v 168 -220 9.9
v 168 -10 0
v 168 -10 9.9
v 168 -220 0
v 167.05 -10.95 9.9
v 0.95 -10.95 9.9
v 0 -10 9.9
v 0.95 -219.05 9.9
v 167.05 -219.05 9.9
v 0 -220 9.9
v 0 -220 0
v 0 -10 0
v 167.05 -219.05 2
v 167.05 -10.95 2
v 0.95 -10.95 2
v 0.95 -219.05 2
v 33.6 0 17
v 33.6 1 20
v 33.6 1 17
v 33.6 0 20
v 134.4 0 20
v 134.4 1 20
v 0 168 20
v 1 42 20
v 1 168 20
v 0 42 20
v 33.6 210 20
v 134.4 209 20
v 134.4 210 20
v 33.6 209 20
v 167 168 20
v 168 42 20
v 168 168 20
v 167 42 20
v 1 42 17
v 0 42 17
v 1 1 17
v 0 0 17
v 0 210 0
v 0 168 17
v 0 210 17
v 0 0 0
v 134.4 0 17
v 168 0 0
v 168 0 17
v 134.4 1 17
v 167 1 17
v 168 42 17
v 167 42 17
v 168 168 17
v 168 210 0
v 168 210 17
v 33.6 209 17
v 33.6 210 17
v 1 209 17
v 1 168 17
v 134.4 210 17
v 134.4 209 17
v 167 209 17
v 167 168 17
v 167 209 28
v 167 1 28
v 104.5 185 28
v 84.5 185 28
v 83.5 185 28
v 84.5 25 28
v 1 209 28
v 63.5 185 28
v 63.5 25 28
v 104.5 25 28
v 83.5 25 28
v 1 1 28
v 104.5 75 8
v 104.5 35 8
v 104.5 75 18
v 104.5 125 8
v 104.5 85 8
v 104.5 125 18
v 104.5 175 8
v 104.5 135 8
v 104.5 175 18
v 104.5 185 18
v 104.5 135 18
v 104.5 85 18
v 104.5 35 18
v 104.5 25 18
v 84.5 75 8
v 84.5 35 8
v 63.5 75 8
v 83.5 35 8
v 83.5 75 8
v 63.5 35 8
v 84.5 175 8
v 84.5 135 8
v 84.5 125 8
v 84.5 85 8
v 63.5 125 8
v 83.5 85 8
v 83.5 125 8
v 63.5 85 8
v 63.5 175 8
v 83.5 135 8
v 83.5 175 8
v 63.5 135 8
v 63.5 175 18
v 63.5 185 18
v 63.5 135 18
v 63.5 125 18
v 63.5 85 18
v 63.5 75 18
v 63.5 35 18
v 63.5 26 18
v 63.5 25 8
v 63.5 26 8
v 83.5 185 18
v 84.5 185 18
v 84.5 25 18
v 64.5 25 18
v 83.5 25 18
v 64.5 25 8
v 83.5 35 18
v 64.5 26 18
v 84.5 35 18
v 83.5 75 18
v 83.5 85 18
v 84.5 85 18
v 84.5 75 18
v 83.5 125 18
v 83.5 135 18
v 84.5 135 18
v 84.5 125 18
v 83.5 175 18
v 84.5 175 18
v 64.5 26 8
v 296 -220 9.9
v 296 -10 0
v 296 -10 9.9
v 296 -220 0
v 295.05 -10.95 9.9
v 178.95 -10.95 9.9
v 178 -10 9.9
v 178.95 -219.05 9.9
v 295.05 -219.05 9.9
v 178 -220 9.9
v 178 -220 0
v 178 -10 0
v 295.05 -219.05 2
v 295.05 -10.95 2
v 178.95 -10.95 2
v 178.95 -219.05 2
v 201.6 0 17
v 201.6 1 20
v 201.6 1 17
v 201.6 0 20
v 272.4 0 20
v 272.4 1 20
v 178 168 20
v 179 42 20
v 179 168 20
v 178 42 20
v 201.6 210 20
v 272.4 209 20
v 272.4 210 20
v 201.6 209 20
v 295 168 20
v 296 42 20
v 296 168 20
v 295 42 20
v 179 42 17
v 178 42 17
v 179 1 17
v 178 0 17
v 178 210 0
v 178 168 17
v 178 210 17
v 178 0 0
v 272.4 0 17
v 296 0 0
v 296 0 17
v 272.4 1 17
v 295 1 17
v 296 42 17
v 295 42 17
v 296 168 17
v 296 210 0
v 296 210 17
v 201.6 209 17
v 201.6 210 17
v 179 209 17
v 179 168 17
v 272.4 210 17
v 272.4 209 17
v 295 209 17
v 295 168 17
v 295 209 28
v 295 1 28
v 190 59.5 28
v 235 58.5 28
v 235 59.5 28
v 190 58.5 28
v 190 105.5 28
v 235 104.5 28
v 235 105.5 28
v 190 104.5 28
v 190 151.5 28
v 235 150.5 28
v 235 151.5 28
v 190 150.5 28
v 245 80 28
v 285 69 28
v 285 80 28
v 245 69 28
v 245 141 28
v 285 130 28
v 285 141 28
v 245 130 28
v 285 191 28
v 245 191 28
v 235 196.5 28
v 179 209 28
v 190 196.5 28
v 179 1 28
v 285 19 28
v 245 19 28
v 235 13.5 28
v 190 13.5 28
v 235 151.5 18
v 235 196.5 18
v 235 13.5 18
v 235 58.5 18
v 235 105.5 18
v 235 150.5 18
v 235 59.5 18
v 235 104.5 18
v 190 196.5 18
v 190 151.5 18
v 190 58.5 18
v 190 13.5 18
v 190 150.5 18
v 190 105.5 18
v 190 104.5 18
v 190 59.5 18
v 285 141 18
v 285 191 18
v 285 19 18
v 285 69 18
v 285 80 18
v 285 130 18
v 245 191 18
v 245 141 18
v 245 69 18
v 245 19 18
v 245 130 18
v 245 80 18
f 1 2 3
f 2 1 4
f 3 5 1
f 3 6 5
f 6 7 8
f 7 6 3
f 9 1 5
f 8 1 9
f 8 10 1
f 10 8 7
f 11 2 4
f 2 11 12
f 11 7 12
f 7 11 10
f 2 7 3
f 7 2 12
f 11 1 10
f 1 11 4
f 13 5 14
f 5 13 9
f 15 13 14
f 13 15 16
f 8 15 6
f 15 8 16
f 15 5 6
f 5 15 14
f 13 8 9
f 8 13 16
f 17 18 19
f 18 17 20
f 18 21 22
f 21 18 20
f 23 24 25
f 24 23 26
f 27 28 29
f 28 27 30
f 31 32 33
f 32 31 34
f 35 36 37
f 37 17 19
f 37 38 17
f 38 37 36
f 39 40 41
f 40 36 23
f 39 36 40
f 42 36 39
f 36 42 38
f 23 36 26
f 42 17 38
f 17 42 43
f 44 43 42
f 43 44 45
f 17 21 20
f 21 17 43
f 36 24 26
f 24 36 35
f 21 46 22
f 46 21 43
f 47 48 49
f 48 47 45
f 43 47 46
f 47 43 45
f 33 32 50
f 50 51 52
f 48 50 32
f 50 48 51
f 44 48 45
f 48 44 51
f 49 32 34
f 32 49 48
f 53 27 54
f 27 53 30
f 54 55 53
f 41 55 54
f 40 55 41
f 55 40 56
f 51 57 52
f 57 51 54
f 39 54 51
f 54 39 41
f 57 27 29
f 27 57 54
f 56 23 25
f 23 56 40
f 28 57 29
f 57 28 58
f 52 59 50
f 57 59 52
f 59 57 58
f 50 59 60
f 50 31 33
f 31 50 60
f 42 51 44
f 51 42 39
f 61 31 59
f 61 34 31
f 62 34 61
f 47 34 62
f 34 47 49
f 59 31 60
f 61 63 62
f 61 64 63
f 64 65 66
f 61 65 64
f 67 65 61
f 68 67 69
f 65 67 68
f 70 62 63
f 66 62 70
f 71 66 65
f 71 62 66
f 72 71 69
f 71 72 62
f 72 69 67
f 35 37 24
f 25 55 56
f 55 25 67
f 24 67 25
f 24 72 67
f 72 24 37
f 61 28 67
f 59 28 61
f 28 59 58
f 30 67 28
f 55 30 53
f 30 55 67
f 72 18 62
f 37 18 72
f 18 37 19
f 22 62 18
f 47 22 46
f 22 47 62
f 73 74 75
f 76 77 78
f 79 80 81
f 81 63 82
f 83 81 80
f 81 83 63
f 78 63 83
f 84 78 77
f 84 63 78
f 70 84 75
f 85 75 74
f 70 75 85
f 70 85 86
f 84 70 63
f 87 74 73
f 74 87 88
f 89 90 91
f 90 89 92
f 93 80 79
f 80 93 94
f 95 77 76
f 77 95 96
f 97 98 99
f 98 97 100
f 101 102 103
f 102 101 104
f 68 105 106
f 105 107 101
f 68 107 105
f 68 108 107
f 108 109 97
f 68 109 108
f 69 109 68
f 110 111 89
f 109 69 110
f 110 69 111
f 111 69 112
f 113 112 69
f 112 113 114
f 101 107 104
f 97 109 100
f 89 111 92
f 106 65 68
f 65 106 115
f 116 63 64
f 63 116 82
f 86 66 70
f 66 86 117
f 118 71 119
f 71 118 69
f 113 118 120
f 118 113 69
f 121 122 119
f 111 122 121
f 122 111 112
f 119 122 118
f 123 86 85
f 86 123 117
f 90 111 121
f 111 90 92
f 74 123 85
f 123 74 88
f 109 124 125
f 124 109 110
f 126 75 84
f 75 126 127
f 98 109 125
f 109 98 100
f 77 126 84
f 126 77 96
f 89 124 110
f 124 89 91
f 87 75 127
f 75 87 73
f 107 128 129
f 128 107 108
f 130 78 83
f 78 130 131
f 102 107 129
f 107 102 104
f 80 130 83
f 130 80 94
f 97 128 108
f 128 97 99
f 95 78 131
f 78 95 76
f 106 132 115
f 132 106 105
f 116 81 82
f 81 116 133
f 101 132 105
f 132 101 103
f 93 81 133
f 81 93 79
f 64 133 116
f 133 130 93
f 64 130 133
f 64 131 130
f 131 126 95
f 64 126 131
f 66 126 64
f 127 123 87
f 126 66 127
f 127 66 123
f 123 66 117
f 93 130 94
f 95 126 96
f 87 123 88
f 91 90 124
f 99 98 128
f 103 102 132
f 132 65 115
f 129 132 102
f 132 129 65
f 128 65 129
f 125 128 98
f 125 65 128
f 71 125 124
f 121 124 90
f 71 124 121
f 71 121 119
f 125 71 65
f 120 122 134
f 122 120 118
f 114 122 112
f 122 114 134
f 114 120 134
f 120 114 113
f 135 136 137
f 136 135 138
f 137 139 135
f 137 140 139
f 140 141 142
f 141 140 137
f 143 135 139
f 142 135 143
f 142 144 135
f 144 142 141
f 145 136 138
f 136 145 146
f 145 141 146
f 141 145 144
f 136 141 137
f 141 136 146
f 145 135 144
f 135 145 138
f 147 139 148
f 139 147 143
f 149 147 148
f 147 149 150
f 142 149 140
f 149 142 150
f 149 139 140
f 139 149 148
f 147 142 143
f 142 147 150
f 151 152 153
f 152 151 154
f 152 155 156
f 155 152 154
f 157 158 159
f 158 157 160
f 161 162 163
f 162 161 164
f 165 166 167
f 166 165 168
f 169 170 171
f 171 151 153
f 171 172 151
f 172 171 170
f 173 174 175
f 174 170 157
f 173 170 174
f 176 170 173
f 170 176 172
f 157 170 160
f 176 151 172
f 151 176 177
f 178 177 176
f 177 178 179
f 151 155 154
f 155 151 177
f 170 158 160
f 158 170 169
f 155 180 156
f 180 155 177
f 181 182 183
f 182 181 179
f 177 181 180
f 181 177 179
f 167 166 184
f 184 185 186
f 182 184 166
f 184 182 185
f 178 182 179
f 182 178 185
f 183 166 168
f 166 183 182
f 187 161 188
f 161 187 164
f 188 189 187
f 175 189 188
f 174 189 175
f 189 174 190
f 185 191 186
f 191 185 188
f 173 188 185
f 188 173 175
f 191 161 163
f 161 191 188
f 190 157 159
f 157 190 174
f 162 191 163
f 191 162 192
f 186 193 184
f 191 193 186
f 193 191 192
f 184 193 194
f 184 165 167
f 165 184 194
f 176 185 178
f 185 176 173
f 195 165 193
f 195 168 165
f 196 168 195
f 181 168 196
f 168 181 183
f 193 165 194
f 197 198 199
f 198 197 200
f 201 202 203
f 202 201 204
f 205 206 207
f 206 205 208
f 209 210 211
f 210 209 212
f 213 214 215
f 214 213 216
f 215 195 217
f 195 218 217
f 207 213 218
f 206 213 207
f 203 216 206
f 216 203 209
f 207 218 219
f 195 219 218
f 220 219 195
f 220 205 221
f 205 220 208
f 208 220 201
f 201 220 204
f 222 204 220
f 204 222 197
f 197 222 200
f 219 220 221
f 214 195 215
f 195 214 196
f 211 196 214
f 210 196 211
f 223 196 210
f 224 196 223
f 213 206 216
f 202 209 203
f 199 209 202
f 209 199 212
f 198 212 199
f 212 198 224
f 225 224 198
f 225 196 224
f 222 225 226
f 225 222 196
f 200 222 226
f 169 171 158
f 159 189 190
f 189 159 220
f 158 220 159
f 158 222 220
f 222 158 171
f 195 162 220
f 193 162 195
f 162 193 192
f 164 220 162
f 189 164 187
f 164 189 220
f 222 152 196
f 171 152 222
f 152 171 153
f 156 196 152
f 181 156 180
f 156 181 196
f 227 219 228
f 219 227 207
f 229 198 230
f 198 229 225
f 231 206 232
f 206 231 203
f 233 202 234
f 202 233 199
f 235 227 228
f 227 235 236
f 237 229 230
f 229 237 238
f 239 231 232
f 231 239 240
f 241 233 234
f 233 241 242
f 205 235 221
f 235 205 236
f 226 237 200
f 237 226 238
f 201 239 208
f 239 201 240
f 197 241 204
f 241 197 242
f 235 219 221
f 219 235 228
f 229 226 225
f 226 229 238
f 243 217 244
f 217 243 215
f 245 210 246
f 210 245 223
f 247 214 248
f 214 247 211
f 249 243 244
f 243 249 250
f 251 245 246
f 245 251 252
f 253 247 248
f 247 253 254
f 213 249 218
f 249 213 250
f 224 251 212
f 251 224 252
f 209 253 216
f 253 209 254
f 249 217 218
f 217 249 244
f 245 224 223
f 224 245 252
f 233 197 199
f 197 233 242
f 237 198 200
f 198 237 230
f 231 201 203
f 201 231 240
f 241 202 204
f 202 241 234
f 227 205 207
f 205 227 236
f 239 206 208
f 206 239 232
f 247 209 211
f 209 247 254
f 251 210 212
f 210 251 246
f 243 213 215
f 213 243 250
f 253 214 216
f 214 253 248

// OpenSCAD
include <../boardgame_insert_toolkit_lib.scad>;


// This is a working example of the Boardgame Insert Toolkit used to create a single large box insert
// for the Z-Man game, Pandemic. It is designed for a printer that can print 290mm x 210mm x 28mm.
// See the two box version for an example of a design for smaller printers.
// 
data =
[
    [   "card box",
        [
            [ "box_dimensions",                             [168.0, 210.0, 28.0] ],                       // float f -- default:[ 100, 100, 100]
            [ "enabled",                                    true ],

            [   "components",
                [
                    [   "cards",
                        [
                            ["type",                        "chit_stack"],              // "cards" | "chits" | "generic" -- default: "generic"
                            ["compartment_size",            [ 20.0, 40.0, 20.0] ],      // float f -- default:[ 10, 10, 10]
                            ["num_compartments",            [2, 3] ],                   // int i -- default: [1, 1]
                            ["enabled",                     true ],                     // true | false
                            ["rotation",                    0 ],                        // 0 | 1 
                      //      ["position",                    [0,0]]

                        ]
                    ],
                ]
            ]
        ]
    ],

    [   "chits box",
        [
            [ "box_dimensions",                             [118.0, 210.0, 28.0] ],                       // float f -- default:[ 100, 100, 100]
            [ "enabled",                                    true ],

            [   "components",
                [
                    [   "disease markers",
                        [
                            ["enabled",                     true ],                     // true | false
                            ["type",                        "chits"],
                            ["compartment_size",            [ 45.0, 45.0, 10.0] ],
                            ["num_compartments",            [1, 4] ],
                            ["position",                    [10, "center"] ],
                        ]
                    ],

                    [   "other bits",
                        [
                            ["enabled",                     true ],                     // true | false
                            ["type",                        "chits"],
                            ["compartment_size",            [ 40.0, 50.0, 10.0] ],
                            ["num_compartments",            [1, 3] ],
                            ["position",                    [65, "center"] ],
                            ["extra_spacing",               [0, 10] ]
                        ]
                    ]
                ]
            ]
        ]
    ]
];


// for printing control.
b_print_lid = true;
b_print_box = true;

b_print_box = "29cm box"; // isolate one box to print

MakeAll();
